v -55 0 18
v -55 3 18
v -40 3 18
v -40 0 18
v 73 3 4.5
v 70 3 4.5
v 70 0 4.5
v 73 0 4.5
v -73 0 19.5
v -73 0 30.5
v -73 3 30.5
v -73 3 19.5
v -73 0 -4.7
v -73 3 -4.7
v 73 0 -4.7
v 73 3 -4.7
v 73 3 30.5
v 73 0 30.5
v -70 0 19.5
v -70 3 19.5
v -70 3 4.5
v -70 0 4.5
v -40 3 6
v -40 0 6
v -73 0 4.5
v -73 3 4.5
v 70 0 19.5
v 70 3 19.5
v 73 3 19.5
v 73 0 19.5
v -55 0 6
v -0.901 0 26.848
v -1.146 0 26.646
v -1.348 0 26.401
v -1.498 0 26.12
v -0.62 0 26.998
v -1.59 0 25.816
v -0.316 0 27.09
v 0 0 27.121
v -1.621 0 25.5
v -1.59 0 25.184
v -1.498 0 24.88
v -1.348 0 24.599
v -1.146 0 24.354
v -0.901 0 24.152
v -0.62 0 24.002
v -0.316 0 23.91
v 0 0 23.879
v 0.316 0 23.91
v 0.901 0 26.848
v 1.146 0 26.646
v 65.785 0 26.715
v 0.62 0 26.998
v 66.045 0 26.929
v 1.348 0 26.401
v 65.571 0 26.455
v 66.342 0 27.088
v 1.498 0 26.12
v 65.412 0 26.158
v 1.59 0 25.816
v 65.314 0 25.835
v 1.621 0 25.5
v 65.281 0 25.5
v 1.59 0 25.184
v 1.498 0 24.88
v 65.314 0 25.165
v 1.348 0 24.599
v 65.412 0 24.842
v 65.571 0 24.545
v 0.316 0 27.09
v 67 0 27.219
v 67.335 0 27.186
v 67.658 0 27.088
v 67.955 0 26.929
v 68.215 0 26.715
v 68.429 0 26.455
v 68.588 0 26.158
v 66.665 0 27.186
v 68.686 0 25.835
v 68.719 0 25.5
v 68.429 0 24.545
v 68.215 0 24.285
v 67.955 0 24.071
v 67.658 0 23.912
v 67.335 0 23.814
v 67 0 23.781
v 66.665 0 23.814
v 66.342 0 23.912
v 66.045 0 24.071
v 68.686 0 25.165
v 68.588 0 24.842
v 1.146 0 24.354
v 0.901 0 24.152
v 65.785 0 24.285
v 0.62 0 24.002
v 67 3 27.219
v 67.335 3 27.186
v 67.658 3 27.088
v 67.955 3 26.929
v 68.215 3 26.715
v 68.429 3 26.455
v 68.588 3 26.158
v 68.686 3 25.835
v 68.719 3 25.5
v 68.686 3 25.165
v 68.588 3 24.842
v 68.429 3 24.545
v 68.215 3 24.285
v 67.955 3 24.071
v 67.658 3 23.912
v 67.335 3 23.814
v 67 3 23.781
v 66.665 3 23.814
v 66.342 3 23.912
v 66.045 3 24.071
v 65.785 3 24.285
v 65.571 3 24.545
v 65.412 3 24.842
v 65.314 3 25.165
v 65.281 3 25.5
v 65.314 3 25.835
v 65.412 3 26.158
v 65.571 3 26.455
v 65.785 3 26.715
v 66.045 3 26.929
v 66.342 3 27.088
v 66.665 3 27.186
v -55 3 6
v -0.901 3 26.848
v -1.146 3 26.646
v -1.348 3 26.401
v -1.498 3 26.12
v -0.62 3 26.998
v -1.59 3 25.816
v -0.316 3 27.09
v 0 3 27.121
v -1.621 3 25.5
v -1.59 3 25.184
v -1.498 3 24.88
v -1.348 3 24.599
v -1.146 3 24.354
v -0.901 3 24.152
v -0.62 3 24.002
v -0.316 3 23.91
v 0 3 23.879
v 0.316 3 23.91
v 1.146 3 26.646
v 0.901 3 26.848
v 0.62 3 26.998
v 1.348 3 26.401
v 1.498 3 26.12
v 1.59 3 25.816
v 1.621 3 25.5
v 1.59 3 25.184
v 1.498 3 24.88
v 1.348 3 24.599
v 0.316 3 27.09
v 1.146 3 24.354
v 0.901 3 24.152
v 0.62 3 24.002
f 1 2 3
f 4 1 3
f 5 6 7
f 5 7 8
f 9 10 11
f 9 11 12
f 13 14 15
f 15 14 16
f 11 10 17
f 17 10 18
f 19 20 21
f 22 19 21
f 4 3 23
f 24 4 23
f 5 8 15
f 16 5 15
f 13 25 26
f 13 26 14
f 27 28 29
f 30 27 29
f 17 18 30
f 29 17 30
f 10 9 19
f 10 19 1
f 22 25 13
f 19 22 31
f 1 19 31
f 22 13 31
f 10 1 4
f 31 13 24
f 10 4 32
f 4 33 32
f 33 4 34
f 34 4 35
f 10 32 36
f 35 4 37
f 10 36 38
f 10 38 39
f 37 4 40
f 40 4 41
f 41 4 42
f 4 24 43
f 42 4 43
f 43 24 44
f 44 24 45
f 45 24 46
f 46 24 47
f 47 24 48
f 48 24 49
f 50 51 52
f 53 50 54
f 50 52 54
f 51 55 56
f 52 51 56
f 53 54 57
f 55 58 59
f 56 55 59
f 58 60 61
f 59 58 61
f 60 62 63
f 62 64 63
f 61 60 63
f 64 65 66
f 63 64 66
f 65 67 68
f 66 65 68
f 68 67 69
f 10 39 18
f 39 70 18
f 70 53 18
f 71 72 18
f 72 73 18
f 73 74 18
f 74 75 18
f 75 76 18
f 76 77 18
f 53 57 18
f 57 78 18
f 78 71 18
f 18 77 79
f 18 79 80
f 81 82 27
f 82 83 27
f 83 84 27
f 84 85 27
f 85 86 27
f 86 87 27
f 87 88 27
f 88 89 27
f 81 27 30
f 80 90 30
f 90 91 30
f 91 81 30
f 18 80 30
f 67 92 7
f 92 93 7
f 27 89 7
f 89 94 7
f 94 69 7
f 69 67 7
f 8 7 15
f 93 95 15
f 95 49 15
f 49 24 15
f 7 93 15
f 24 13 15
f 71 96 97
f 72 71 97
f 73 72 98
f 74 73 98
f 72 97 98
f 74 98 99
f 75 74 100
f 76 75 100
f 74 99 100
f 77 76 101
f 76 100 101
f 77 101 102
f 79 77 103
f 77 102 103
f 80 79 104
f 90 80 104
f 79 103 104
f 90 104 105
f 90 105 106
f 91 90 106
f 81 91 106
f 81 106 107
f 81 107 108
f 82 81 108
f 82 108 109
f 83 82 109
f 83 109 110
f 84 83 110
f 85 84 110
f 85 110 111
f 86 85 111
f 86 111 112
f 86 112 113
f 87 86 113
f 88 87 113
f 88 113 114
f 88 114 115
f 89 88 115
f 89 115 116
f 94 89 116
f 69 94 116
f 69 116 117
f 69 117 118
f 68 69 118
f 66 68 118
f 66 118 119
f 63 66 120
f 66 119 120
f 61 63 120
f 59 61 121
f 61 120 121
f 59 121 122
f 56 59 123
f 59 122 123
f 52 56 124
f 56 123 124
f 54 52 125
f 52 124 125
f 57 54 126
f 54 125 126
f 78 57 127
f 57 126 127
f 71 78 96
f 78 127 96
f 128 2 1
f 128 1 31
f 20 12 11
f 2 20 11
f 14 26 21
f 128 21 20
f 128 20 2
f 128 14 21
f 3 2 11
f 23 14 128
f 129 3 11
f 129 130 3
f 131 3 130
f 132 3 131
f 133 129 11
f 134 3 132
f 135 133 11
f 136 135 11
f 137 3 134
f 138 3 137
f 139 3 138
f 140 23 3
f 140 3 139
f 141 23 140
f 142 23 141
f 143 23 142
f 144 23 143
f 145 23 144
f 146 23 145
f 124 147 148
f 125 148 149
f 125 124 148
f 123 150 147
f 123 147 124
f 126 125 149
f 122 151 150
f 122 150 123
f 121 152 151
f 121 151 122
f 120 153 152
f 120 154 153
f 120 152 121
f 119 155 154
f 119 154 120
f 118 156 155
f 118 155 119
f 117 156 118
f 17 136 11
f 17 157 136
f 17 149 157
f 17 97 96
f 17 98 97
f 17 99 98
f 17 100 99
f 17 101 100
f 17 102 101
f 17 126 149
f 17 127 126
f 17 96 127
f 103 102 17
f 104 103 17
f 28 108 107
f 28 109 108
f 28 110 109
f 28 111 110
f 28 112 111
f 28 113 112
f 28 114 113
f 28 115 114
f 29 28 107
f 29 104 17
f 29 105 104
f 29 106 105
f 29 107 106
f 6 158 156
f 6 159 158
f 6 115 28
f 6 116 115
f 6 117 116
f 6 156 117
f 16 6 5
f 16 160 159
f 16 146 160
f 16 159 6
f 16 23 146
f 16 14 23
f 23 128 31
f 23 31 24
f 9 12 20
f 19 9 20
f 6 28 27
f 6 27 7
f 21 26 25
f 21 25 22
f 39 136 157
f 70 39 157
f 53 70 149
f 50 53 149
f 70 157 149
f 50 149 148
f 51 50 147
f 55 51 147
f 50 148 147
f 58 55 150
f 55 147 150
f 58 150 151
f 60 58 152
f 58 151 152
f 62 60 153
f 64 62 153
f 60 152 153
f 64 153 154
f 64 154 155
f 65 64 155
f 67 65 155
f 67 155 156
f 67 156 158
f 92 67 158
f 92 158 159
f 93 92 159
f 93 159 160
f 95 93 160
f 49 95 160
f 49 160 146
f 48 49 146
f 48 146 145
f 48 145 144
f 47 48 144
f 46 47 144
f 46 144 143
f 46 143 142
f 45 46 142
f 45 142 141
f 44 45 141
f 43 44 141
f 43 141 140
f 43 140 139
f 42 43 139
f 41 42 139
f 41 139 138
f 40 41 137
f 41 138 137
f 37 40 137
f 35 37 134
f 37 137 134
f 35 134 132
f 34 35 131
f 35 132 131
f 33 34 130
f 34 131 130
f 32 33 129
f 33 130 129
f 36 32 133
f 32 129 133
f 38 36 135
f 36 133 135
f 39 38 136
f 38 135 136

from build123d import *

# Parameters (mm, degrees)
SKETCH1_W           = 146
SKETCH1_H           = 61
BOSS_EXTRUDE1_DEPTH = 3
SKETCH2_R           = 1.621357424
SKETCH2_R_2         = 1.718635432
SKETCH2_W           = 3
SKETCH2_H           = 15
SKETCH2_W_2         = 15
SKETCH2_H_2         = 12
SKETCH2_W_3         = 30
SKETCH2_H_3         = 3
CUT_EXTRUDE1_DEPTH  = 10
SKETCH3_W           = 146
SKETCH3_H           = 25.8
CUT_EXTRUDE2_DEPTH  = 10


with BuildPart() as part:
    # Sketch1 → Boss-Extrude1 (new body)
    with BuildSketch(Plane(origin=(0, 0, 0), x_dir=(1, 0, 0), z_dir=(0, 1, 0))):
        Rectangle(SKETCH1_W, SKETCH1_H)
    extrude(amount=BOSS_EXTRUDE1_DEPTH)

    # Sketch2 → Cut-Extrude1 (cut)
    with BuildSketch(Plane(origin=(0, 3, 0), x_dir=(1, 0, 0), z_dir=(0, 1, 0))):
        with Locations(Location((0, -25.5, 0), (0, 0, 270))):
            Circle(SKETCH2_R)
        with Locations(Location((67, -25.5, 0), (0, 0, 270))):
            Circle(SKETCH2_R_2)
        with Locations((-71.5, -12)):
            Rectangle(SKETCH2_W, SKETCH2_H)
        with Locations((71.5, 13)):
            Rectangle(SKETCH2_W, SKETCH2_H)
        with Locations((71.5, -12)):
            Rectangle(SKETCH2_W, SKETCH2_H)
        with Locations((-71.5, 13)):
            Rectangle(SKETCH2_W, SKETCH2_H)
        with Locations((-47.5, -12)):
            Rectangle(SKETCH2_W_2, SKETCH2_H_2)
        with Locations((-28, 29)):
            Rectangle(SKETCH2_W_3, SKETCH2_H_3)
        with Locations((28, 29)):
            Rectangle(SKETCH2_W_3, SKETCH2_H_3)
    extrude(amount=-CUT_EXTRUDE1_DEPTH, mode=Mode.SUBTRACT)

    # Sketch3 → Cut-Extrude2 (cut)
    with BuildSketch(Plane(origin=(0, 3, 0), x_dir=(1, 0, 0), z_dir=(0, 1, 0))):
        with Locations((0, 17.6)):
            Rectangle(SKETCH3_W, SKETCH3_H)
    extrude(amount=-CUT_EXTRUDE2_DEPTH, mode=Mode.SUBTRACT)


solid = part.part
